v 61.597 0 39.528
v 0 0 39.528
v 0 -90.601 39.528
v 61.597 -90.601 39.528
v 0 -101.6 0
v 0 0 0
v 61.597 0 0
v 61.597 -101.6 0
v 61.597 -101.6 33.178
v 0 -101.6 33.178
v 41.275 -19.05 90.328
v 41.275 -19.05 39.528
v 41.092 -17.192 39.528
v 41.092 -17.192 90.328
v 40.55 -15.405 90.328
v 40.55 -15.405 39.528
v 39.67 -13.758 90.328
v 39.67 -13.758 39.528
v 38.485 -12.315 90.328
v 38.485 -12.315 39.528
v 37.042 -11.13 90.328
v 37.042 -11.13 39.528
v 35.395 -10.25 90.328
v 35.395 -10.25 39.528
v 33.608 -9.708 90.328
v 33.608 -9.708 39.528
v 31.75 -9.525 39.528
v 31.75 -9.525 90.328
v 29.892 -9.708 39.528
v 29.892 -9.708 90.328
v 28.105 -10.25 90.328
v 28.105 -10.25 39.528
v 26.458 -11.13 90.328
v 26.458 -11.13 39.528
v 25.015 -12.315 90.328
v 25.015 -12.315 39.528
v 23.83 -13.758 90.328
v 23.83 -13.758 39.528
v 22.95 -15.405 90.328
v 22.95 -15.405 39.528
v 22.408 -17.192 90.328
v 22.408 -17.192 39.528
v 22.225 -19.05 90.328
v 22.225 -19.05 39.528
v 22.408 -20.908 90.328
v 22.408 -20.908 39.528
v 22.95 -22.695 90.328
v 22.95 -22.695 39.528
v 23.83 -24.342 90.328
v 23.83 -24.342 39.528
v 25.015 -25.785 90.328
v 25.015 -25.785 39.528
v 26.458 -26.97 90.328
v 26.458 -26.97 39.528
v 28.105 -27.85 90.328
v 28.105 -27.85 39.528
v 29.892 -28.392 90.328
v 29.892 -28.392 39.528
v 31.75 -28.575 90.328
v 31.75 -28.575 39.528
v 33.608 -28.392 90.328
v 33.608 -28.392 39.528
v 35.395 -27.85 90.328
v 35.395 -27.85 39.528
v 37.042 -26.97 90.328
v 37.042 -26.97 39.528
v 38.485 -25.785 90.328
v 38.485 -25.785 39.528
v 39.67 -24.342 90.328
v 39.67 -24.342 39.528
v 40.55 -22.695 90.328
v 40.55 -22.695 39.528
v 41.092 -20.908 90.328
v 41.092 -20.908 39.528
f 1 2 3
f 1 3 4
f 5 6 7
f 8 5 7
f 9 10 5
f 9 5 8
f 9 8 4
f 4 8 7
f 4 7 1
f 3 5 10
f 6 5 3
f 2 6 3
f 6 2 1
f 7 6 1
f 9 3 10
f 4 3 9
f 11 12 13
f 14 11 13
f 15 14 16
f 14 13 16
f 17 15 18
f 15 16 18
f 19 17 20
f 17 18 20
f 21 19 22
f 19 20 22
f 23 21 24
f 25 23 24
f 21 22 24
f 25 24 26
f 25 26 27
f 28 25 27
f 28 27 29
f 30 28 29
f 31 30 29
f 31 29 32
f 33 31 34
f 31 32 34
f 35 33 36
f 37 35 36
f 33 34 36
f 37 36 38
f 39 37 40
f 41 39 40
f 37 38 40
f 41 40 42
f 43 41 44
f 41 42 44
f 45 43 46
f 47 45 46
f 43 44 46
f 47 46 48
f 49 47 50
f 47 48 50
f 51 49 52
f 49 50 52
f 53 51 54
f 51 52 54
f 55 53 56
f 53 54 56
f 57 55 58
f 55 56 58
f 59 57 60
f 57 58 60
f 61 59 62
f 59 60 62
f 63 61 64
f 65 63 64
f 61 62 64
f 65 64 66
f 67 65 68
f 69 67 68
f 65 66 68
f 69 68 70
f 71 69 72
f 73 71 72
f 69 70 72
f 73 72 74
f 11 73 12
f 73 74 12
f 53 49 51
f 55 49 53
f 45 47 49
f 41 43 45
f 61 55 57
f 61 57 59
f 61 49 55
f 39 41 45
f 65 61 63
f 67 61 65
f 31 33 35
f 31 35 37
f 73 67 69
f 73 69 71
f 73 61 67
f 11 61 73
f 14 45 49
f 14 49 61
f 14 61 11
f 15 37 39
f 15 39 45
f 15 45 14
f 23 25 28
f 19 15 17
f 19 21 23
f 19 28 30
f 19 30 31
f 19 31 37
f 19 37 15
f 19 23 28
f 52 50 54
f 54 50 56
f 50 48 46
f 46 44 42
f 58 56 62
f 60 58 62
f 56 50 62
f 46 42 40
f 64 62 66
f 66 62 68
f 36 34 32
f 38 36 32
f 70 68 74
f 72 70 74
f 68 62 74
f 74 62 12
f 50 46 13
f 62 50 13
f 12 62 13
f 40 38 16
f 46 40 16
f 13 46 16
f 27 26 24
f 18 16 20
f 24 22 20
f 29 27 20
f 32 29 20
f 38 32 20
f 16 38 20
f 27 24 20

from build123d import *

# Parameters (mm, degrees)
F0_W     = 61.5972094238
F0_H     = 39.5282879472
F1_DEPTH = 101.6
F2_SIZE2 = 10.9985226281
F2_SIZE  = 6.35
F3_R     = 9.525
F4_DEPTH = 50.8


with BuildPart() as f1:
    # F0 (on Front) → F1 (new body)
    with BuildSketch(Plane.XZ):
        with Locations((30.7986047119, 19.7641439736)):
            Rectangle(F0_W, F0_H)
    extrude(amount=F1_DEPTH)

    # F2
    f2_edges = [f1.edges().sort_by_distance(p)[0] for p in [
        (30.798605, -101.6, 39.528288),
    ]]
    f2_side = f1.faces().sort_by_distance((30.798605, -101.6, 19.764144))[0]
    chamfer(f2_edges, length=F2_SIZE, length2=F2_SIZE2, reference=f2_side)


with BuildPart() as f4:
    # F3 (on face) → F4 (new body)
    with BuildSketch(Plane.XY.offset(39.5282879472)):
        with Locations((31.75, -19.05)):
            Circle(F3_R)
    extrude(amount=F4_DEPTH)


solid = Compound([f1.part, f4.part])
